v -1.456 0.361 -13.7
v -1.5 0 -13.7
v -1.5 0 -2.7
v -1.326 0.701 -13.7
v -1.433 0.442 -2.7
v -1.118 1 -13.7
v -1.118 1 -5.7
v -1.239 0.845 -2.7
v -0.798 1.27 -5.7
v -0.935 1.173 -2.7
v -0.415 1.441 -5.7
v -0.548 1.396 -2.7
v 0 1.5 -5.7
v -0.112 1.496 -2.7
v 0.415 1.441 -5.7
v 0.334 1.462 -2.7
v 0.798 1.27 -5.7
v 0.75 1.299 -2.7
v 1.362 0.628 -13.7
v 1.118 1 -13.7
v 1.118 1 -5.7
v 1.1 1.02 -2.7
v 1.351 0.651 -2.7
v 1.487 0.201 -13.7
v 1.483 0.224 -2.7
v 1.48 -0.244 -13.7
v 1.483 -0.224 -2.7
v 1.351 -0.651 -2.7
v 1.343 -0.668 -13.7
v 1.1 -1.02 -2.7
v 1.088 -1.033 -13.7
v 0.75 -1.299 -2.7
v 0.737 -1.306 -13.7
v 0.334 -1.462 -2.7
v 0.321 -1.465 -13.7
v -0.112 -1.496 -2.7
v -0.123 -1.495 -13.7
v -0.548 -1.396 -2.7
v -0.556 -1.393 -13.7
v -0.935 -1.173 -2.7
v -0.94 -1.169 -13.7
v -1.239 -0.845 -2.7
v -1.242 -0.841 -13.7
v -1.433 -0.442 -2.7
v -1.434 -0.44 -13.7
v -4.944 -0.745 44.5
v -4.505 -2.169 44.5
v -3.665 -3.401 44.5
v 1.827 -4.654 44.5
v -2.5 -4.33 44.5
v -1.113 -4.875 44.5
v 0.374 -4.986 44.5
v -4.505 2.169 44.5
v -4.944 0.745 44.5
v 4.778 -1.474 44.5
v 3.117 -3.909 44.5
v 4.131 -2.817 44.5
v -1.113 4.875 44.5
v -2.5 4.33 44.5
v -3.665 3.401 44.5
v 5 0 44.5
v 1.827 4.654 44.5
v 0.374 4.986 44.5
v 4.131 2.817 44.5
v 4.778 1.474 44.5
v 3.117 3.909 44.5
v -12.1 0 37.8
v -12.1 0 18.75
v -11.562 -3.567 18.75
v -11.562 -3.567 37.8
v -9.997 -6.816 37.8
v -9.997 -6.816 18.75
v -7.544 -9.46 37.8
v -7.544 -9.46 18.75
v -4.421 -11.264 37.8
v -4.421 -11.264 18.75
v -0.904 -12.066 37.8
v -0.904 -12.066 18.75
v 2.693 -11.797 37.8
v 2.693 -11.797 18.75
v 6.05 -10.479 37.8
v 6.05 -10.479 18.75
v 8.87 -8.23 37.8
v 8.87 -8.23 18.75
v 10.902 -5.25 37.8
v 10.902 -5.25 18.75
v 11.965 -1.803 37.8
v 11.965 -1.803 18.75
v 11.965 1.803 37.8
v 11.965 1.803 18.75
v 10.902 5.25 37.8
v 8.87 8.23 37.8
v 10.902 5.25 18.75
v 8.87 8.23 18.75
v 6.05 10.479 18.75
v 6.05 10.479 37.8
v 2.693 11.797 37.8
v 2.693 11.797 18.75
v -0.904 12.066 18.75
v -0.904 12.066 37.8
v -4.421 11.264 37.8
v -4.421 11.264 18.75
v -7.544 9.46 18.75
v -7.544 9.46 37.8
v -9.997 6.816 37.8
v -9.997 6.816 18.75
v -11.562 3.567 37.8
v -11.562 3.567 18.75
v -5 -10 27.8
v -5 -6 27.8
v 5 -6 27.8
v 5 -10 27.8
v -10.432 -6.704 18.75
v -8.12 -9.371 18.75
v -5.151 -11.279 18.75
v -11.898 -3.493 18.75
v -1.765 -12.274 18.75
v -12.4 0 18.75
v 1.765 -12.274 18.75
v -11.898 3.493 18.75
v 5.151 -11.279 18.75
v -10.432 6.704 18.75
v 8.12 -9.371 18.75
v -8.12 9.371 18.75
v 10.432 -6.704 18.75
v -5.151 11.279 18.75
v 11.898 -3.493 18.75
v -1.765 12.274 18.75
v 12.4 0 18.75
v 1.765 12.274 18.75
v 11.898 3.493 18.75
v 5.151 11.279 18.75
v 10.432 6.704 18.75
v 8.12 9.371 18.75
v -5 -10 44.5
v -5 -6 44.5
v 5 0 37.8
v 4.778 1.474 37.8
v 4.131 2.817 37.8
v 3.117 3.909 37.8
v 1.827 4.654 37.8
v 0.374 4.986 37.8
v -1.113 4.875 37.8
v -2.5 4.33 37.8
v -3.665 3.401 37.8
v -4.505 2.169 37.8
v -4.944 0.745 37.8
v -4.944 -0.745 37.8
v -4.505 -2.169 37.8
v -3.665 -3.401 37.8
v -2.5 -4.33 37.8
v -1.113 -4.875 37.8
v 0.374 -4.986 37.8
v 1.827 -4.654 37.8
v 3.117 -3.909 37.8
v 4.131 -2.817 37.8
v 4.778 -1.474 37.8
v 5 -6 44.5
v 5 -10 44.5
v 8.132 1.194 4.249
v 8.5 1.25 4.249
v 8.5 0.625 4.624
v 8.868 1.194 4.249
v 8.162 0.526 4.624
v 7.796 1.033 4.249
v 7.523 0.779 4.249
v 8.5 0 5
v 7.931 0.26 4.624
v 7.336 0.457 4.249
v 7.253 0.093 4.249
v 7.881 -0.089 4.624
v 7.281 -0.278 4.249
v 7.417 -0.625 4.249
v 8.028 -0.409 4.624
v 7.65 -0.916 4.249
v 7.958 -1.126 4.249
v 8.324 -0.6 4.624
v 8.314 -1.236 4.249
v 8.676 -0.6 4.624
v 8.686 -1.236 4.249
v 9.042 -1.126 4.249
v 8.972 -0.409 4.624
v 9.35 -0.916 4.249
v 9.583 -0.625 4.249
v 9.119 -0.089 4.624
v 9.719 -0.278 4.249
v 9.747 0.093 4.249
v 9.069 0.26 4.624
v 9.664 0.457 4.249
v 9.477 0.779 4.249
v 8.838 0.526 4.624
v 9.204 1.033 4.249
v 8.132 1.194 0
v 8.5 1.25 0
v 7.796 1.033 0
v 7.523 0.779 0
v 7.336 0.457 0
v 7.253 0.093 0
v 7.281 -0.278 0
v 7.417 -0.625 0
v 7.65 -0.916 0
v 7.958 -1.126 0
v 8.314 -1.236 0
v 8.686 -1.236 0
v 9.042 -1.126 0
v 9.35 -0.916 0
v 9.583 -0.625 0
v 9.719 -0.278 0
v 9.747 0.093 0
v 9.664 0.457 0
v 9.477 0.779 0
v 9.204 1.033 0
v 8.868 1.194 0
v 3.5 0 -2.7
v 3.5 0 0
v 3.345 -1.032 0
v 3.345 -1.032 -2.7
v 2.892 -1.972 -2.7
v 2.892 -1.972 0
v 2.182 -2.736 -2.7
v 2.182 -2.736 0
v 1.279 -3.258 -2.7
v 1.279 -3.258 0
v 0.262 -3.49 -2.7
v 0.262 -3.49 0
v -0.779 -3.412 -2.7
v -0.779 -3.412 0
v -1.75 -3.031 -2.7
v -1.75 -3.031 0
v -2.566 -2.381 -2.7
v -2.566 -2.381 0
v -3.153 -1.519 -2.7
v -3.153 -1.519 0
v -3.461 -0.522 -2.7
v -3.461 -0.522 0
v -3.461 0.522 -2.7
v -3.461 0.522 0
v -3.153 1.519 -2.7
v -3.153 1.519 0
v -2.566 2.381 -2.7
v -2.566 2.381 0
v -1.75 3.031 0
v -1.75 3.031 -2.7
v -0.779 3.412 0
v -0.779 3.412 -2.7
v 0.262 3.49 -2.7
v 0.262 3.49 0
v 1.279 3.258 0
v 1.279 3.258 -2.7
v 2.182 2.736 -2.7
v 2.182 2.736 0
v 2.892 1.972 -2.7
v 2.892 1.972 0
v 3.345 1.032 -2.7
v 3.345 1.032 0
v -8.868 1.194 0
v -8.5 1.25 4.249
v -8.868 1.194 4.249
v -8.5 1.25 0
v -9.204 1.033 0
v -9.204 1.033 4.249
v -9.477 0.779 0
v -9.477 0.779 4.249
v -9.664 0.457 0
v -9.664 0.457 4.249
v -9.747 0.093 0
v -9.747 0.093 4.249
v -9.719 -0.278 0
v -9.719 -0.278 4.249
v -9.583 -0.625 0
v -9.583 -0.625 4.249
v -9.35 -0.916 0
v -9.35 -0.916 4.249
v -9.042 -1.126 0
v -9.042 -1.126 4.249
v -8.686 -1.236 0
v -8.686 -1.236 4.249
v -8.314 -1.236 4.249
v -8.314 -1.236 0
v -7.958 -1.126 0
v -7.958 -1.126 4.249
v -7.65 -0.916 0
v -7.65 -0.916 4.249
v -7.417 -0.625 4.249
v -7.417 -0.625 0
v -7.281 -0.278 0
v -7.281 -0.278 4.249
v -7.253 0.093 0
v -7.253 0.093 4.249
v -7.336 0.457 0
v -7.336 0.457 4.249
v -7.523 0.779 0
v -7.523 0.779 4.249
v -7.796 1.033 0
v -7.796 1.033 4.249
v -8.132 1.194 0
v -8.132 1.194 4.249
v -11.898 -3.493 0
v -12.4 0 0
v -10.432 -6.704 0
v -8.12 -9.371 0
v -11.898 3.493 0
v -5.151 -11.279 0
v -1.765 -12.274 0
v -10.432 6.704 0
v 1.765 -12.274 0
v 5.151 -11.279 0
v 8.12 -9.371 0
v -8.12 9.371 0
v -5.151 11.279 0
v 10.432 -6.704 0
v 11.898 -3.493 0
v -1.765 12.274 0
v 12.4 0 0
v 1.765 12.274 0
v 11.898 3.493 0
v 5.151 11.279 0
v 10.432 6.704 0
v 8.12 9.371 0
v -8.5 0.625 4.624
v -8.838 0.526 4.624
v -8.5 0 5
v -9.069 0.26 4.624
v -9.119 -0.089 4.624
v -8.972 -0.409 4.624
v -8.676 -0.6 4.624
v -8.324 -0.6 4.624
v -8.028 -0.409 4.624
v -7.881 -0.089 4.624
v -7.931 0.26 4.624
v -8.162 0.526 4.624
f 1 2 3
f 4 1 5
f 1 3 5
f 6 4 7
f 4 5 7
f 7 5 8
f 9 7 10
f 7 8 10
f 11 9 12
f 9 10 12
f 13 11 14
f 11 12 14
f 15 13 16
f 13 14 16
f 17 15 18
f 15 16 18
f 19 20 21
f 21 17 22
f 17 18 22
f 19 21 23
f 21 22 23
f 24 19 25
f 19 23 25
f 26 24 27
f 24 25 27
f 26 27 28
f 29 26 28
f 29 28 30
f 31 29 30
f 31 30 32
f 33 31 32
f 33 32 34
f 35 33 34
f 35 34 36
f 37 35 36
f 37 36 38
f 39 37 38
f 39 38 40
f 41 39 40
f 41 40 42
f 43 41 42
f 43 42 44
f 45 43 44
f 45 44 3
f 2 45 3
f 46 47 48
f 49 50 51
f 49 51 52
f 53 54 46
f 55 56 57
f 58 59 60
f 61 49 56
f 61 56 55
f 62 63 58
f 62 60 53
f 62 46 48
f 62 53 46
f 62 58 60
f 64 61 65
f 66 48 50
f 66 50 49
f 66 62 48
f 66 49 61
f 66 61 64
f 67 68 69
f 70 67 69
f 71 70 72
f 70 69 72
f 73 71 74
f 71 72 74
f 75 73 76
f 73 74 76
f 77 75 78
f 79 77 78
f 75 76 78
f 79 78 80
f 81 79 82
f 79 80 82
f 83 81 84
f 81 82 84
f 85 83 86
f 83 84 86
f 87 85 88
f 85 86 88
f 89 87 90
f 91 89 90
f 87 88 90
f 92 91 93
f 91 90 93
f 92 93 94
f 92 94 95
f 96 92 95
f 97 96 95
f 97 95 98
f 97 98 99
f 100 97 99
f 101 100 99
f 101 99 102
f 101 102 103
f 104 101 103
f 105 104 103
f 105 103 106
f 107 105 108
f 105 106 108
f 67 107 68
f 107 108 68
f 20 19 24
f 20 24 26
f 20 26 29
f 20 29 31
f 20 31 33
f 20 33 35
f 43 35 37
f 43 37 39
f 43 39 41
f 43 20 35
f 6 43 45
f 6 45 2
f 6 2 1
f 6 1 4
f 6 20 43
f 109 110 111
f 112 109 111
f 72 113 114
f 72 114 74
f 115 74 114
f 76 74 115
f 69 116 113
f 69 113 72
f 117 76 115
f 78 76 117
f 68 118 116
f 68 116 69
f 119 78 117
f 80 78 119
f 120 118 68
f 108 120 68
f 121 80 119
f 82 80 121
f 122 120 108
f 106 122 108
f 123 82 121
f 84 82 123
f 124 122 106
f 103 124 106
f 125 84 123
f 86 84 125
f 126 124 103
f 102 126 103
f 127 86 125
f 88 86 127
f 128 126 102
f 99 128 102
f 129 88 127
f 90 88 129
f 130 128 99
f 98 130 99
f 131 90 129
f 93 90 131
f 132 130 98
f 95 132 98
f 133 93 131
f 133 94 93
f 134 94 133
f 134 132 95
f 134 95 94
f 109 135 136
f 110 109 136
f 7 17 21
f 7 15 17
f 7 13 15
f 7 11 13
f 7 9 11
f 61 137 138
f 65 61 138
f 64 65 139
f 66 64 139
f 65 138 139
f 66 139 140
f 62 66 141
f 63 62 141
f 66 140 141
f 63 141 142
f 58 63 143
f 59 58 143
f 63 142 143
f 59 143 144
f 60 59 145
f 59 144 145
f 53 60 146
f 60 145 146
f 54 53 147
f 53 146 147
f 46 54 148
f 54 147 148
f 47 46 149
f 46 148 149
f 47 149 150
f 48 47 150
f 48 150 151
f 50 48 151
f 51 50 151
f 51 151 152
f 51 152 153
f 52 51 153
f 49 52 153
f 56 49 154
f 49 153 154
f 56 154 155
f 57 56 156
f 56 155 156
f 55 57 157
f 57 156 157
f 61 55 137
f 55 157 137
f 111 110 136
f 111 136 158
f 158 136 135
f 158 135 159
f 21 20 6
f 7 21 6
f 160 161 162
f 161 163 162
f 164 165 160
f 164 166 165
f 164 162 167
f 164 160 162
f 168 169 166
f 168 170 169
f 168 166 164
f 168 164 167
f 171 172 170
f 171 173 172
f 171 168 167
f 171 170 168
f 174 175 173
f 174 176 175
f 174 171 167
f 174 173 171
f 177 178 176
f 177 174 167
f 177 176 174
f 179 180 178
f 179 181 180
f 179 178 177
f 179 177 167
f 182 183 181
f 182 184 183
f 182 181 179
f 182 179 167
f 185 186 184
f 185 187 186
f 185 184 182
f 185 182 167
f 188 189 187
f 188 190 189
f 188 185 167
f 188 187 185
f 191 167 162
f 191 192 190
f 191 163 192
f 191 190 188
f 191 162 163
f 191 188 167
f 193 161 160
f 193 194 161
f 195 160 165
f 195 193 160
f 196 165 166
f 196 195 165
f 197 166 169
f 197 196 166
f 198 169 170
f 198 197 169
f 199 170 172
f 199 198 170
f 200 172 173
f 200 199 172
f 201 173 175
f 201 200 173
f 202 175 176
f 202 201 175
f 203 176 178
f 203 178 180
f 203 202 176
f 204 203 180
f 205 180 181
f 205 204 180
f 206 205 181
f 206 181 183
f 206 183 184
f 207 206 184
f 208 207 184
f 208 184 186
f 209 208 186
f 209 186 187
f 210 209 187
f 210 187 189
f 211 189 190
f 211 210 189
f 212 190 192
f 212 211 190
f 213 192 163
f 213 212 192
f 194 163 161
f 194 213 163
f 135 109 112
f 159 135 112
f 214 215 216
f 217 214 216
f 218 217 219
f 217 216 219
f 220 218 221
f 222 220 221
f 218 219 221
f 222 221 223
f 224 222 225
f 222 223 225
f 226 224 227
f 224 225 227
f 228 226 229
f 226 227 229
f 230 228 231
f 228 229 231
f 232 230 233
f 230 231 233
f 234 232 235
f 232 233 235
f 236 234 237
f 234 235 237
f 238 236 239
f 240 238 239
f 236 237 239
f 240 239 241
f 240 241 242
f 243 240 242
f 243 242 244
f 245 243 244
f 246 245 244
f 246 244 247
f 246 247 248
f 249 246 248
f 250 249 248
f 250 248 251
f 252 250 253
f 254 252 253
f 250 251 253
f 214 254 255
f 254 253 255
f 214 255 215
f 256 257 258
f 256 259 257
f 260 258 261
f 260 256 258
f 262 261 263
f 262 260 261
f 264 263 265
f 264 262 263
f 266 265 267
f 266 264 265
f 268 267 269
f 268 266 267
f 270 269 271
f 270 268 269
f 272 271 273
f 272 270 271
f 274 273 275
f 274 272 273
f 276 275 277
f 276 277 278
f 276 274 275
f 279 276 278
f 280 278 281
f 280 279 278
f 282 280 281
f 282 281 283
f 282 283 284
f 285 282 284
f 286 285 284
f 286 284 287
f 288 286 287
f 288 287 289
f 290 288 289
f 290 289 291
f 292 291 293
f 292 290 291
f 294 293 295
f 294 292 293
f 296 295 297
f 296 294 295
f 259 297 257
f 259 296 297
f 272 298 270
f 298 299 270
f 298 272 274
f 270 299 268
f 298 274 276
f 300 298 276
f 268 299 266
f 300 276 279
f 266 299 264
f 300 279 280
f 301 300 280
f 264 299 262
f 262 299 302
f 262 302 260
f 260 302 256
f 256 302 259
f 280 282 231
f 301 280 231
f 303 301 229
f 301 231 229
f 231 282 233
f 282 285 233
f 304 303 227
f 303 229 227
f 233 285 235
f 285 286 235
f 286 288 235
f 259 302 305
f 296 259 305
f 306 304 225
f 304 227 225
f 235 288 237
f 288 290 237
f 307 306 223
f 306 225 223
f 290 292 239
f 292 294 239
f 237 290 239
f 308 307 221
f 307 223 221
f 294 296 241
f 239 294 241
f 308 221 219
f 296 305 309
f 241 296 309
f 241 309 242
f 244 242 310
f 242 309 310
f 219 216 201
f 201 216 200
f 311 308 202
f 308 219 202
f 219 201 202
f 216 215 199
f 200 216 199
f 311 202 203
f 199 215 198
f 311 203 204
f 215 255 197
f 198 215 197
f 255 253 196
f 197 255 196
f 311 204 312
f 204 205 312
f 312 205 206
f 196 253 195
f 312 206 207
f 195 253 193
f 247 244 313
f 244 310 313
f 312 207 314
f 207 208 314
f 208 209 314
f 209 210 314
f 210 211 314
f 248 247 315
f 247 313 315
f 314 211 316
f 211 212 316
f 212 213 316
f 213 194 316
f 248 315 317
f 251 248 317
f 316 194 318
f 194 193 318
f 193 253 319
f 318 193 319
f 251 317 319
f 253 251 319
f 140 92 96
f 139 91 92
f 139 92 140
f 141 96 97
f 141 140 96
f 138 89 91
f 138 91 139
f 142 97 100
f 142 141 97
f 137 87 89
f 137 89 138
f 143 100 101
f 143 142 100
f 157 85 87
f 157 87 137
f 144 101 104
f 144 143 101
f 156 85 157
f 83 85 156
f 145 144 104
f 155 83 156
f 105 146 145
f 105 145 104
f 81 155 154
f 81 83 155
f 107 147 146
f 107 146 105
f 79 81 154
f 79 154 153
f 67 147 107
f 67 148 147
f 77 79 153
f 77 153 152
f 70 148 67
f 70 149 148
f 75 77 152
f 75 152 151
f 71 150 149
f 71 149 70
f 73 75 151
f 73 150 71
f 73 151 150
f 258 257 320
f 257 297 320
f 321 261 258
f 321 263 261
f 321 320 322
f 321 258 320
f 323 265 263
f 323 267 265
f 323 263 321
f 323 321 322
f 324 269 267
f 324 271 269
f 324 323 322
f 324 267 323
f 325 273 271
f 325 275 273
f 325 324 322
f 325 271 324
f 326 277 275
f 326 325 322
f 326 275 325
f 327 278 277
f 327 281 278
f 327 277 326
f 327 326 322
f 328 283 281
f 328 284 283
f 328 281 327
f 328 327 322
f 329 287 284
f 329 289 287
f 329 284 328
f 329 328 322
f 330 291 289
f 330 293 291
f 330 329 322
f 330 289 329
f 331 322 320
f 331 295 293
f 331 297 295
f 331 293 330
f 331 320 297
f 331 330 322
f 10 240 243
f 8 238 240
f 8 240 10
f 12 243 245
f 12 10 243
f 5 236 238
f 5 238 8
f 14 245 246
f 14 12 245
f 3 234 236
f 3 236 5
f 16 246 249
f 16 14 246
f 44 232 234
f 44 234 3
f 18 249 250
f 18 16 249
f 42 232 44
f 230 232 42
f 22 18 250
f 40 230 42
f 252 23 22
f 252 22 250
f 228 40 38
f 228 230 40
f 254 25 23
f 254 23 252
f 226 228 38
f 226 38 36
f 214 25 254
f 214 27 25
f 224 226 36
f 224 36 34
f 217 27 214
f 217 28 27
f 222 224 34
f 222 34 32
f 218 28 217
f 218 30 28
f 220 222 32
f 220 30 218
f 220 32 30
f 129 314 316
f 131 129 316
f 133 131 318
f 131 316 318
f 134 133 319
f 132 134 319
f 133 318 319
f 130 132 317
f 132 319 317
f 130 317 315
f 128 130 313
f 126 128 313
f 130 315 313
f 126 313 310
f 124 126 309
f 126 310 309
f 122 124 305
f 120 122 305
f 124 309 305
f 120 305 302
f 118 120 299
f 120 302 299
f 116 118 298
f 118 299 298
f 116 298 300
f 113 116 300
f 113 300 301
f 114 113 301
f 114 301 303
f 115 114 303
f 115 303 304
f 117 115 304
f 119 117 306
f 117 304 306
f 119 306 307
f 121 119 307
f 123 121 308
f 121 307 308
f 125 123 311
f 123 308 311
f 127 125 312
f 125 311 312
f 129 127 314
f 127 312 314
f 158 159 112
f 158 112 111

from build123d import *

# Parameters (mm, degrees)
SKETCH_1_R                  = 12.4
EXTRUDE_1_DEPTH             = 18.75
SKETCH_2_R                  = 12.1
EXTRUDE_2_DEPTH             = 19.05
SKETCH_3_R                  = 3.5
EXTRUDE_3_DEPTH             = 2.7
SKETCH_4_R                  = 1.5
EXTRUDE_4_DEPTH             = 11
SKETCH_5_W                  = 3.74465869
SKETCH_5_H                  = 1.716918609
CUT_EXTRUDE_1_DEPTH         = 8
SKETCH_6_R                  = 5
EXTRUDE_5_DEPTH             = 6.7
SKETCH_7_W                  = 10
SKETCH_7_H                  = 4
EXTRUDE_6_DEPTH             = 16.7
HOLE_WIZARD_M3_1_AT_2_COUNT = 2
HOLE_WIZARD_M3_1_AT_2_PITCH = 17


with BuildPart() as part:
    # 草图1 → 凸台-拉伸1 (new body)
    with BuildSketch(Plane.XY):
        Circle(SKETCH_1_R)
    extrude(amount=EXTRUDE_1_DEPTH)

    # 草图2 → 凸台-拉伸2 (add)
    with BuildSketch(Plane.XY.offset(18.75)):
        with Locations(Location((0, 0, 0), (0, 0, 180))):
            Circle(SKETCH_2_R)
    extrude(amount=EXTRUDE_2_DEPTH)

    # 草图3 → 凸台-拉伸3 (add)
    with BuildSketch(Plane(origin=(0, 0, 0), x_dir=(-1, 0, 0), z_dir=(0, 0, -1))):
        with Locations(Location((0, 0, 0), (0, 0, 180))):
            Circle(SKETCH_3_R)
    extrude(amount=EXTRUDE_3_DEPTH)

    # 草图4 → 凸台-拉伸4 (add)
    with BuildSketch(Plane(origin=(0, 0, -2.7), x_dir=(-1, 0, 0), z_dir=(0, 0, -1))):
        Circle(SKETCH_4_R)
    extrude(amount=EXTRUDE_4_DEPTH)

    # 草图5 → 切除-拉伸1 (cut)
    with BuildSketch(Plane(origin=(0, 0, -13.7), x_dir=(-1, 0, 0), z_dir=(0, 0, -1))):
        with Locations((0.301742381, 1.858459305)):
            Rectangle(SKETCH_5_W, SKETCH_5_H)
    extrude(amount=-CUT_EXTRUDE_1_DEPTH, mode=Mode.SUBTRACT)

    # 草图6 → 凸台-拉伸5 (add)
    with BuildSketch(Plane.XY.offset(37.8)):
        Circle(SKETCH_6_R)
    extrude(amount=EXTRUDE_5_DEPTH)

    # 草图9 → M3 螺纹孔1 (revolve, cut)
    with BuildSketch(Plane.YZ.offset(-8.5)):
        Polygon((0, 0), (0, 5), (1.25, 4.248924226), (1.25, 0), align=None)
    hole_wizard_m3_1 = revolve(axis=Axis((-8.5, 0, -6.35), (0, 0, 1)), mode=Mode.SUBTRACT)

    # M3 螺纹孔1 at 2: M3 螺纹孔1 ×2
    with Locations(*[(i * HOLE_WIZARD_M3_1_AT_2_PITCH, 0, 0) for i in range(1, HOLE_WIZARD_M3_1_AT_2_COUNT)]):
        add(hole_wizard_m3_1, mode=Mode.SUBTRACT)


with BuildPart() as body_2:
    # 草图7 → 凸台-拉伸6 (new body)
    with BuildSketch(Plane.XY.offset(44.5)):
        with Locations((0, -8)):
            Rectangle(SKETCH_7_W, SKETCH_7_H)
    extrude(amount=-EXTRUDE_6_DEPTH)


solid = Compound([part.part, body_2.part])
